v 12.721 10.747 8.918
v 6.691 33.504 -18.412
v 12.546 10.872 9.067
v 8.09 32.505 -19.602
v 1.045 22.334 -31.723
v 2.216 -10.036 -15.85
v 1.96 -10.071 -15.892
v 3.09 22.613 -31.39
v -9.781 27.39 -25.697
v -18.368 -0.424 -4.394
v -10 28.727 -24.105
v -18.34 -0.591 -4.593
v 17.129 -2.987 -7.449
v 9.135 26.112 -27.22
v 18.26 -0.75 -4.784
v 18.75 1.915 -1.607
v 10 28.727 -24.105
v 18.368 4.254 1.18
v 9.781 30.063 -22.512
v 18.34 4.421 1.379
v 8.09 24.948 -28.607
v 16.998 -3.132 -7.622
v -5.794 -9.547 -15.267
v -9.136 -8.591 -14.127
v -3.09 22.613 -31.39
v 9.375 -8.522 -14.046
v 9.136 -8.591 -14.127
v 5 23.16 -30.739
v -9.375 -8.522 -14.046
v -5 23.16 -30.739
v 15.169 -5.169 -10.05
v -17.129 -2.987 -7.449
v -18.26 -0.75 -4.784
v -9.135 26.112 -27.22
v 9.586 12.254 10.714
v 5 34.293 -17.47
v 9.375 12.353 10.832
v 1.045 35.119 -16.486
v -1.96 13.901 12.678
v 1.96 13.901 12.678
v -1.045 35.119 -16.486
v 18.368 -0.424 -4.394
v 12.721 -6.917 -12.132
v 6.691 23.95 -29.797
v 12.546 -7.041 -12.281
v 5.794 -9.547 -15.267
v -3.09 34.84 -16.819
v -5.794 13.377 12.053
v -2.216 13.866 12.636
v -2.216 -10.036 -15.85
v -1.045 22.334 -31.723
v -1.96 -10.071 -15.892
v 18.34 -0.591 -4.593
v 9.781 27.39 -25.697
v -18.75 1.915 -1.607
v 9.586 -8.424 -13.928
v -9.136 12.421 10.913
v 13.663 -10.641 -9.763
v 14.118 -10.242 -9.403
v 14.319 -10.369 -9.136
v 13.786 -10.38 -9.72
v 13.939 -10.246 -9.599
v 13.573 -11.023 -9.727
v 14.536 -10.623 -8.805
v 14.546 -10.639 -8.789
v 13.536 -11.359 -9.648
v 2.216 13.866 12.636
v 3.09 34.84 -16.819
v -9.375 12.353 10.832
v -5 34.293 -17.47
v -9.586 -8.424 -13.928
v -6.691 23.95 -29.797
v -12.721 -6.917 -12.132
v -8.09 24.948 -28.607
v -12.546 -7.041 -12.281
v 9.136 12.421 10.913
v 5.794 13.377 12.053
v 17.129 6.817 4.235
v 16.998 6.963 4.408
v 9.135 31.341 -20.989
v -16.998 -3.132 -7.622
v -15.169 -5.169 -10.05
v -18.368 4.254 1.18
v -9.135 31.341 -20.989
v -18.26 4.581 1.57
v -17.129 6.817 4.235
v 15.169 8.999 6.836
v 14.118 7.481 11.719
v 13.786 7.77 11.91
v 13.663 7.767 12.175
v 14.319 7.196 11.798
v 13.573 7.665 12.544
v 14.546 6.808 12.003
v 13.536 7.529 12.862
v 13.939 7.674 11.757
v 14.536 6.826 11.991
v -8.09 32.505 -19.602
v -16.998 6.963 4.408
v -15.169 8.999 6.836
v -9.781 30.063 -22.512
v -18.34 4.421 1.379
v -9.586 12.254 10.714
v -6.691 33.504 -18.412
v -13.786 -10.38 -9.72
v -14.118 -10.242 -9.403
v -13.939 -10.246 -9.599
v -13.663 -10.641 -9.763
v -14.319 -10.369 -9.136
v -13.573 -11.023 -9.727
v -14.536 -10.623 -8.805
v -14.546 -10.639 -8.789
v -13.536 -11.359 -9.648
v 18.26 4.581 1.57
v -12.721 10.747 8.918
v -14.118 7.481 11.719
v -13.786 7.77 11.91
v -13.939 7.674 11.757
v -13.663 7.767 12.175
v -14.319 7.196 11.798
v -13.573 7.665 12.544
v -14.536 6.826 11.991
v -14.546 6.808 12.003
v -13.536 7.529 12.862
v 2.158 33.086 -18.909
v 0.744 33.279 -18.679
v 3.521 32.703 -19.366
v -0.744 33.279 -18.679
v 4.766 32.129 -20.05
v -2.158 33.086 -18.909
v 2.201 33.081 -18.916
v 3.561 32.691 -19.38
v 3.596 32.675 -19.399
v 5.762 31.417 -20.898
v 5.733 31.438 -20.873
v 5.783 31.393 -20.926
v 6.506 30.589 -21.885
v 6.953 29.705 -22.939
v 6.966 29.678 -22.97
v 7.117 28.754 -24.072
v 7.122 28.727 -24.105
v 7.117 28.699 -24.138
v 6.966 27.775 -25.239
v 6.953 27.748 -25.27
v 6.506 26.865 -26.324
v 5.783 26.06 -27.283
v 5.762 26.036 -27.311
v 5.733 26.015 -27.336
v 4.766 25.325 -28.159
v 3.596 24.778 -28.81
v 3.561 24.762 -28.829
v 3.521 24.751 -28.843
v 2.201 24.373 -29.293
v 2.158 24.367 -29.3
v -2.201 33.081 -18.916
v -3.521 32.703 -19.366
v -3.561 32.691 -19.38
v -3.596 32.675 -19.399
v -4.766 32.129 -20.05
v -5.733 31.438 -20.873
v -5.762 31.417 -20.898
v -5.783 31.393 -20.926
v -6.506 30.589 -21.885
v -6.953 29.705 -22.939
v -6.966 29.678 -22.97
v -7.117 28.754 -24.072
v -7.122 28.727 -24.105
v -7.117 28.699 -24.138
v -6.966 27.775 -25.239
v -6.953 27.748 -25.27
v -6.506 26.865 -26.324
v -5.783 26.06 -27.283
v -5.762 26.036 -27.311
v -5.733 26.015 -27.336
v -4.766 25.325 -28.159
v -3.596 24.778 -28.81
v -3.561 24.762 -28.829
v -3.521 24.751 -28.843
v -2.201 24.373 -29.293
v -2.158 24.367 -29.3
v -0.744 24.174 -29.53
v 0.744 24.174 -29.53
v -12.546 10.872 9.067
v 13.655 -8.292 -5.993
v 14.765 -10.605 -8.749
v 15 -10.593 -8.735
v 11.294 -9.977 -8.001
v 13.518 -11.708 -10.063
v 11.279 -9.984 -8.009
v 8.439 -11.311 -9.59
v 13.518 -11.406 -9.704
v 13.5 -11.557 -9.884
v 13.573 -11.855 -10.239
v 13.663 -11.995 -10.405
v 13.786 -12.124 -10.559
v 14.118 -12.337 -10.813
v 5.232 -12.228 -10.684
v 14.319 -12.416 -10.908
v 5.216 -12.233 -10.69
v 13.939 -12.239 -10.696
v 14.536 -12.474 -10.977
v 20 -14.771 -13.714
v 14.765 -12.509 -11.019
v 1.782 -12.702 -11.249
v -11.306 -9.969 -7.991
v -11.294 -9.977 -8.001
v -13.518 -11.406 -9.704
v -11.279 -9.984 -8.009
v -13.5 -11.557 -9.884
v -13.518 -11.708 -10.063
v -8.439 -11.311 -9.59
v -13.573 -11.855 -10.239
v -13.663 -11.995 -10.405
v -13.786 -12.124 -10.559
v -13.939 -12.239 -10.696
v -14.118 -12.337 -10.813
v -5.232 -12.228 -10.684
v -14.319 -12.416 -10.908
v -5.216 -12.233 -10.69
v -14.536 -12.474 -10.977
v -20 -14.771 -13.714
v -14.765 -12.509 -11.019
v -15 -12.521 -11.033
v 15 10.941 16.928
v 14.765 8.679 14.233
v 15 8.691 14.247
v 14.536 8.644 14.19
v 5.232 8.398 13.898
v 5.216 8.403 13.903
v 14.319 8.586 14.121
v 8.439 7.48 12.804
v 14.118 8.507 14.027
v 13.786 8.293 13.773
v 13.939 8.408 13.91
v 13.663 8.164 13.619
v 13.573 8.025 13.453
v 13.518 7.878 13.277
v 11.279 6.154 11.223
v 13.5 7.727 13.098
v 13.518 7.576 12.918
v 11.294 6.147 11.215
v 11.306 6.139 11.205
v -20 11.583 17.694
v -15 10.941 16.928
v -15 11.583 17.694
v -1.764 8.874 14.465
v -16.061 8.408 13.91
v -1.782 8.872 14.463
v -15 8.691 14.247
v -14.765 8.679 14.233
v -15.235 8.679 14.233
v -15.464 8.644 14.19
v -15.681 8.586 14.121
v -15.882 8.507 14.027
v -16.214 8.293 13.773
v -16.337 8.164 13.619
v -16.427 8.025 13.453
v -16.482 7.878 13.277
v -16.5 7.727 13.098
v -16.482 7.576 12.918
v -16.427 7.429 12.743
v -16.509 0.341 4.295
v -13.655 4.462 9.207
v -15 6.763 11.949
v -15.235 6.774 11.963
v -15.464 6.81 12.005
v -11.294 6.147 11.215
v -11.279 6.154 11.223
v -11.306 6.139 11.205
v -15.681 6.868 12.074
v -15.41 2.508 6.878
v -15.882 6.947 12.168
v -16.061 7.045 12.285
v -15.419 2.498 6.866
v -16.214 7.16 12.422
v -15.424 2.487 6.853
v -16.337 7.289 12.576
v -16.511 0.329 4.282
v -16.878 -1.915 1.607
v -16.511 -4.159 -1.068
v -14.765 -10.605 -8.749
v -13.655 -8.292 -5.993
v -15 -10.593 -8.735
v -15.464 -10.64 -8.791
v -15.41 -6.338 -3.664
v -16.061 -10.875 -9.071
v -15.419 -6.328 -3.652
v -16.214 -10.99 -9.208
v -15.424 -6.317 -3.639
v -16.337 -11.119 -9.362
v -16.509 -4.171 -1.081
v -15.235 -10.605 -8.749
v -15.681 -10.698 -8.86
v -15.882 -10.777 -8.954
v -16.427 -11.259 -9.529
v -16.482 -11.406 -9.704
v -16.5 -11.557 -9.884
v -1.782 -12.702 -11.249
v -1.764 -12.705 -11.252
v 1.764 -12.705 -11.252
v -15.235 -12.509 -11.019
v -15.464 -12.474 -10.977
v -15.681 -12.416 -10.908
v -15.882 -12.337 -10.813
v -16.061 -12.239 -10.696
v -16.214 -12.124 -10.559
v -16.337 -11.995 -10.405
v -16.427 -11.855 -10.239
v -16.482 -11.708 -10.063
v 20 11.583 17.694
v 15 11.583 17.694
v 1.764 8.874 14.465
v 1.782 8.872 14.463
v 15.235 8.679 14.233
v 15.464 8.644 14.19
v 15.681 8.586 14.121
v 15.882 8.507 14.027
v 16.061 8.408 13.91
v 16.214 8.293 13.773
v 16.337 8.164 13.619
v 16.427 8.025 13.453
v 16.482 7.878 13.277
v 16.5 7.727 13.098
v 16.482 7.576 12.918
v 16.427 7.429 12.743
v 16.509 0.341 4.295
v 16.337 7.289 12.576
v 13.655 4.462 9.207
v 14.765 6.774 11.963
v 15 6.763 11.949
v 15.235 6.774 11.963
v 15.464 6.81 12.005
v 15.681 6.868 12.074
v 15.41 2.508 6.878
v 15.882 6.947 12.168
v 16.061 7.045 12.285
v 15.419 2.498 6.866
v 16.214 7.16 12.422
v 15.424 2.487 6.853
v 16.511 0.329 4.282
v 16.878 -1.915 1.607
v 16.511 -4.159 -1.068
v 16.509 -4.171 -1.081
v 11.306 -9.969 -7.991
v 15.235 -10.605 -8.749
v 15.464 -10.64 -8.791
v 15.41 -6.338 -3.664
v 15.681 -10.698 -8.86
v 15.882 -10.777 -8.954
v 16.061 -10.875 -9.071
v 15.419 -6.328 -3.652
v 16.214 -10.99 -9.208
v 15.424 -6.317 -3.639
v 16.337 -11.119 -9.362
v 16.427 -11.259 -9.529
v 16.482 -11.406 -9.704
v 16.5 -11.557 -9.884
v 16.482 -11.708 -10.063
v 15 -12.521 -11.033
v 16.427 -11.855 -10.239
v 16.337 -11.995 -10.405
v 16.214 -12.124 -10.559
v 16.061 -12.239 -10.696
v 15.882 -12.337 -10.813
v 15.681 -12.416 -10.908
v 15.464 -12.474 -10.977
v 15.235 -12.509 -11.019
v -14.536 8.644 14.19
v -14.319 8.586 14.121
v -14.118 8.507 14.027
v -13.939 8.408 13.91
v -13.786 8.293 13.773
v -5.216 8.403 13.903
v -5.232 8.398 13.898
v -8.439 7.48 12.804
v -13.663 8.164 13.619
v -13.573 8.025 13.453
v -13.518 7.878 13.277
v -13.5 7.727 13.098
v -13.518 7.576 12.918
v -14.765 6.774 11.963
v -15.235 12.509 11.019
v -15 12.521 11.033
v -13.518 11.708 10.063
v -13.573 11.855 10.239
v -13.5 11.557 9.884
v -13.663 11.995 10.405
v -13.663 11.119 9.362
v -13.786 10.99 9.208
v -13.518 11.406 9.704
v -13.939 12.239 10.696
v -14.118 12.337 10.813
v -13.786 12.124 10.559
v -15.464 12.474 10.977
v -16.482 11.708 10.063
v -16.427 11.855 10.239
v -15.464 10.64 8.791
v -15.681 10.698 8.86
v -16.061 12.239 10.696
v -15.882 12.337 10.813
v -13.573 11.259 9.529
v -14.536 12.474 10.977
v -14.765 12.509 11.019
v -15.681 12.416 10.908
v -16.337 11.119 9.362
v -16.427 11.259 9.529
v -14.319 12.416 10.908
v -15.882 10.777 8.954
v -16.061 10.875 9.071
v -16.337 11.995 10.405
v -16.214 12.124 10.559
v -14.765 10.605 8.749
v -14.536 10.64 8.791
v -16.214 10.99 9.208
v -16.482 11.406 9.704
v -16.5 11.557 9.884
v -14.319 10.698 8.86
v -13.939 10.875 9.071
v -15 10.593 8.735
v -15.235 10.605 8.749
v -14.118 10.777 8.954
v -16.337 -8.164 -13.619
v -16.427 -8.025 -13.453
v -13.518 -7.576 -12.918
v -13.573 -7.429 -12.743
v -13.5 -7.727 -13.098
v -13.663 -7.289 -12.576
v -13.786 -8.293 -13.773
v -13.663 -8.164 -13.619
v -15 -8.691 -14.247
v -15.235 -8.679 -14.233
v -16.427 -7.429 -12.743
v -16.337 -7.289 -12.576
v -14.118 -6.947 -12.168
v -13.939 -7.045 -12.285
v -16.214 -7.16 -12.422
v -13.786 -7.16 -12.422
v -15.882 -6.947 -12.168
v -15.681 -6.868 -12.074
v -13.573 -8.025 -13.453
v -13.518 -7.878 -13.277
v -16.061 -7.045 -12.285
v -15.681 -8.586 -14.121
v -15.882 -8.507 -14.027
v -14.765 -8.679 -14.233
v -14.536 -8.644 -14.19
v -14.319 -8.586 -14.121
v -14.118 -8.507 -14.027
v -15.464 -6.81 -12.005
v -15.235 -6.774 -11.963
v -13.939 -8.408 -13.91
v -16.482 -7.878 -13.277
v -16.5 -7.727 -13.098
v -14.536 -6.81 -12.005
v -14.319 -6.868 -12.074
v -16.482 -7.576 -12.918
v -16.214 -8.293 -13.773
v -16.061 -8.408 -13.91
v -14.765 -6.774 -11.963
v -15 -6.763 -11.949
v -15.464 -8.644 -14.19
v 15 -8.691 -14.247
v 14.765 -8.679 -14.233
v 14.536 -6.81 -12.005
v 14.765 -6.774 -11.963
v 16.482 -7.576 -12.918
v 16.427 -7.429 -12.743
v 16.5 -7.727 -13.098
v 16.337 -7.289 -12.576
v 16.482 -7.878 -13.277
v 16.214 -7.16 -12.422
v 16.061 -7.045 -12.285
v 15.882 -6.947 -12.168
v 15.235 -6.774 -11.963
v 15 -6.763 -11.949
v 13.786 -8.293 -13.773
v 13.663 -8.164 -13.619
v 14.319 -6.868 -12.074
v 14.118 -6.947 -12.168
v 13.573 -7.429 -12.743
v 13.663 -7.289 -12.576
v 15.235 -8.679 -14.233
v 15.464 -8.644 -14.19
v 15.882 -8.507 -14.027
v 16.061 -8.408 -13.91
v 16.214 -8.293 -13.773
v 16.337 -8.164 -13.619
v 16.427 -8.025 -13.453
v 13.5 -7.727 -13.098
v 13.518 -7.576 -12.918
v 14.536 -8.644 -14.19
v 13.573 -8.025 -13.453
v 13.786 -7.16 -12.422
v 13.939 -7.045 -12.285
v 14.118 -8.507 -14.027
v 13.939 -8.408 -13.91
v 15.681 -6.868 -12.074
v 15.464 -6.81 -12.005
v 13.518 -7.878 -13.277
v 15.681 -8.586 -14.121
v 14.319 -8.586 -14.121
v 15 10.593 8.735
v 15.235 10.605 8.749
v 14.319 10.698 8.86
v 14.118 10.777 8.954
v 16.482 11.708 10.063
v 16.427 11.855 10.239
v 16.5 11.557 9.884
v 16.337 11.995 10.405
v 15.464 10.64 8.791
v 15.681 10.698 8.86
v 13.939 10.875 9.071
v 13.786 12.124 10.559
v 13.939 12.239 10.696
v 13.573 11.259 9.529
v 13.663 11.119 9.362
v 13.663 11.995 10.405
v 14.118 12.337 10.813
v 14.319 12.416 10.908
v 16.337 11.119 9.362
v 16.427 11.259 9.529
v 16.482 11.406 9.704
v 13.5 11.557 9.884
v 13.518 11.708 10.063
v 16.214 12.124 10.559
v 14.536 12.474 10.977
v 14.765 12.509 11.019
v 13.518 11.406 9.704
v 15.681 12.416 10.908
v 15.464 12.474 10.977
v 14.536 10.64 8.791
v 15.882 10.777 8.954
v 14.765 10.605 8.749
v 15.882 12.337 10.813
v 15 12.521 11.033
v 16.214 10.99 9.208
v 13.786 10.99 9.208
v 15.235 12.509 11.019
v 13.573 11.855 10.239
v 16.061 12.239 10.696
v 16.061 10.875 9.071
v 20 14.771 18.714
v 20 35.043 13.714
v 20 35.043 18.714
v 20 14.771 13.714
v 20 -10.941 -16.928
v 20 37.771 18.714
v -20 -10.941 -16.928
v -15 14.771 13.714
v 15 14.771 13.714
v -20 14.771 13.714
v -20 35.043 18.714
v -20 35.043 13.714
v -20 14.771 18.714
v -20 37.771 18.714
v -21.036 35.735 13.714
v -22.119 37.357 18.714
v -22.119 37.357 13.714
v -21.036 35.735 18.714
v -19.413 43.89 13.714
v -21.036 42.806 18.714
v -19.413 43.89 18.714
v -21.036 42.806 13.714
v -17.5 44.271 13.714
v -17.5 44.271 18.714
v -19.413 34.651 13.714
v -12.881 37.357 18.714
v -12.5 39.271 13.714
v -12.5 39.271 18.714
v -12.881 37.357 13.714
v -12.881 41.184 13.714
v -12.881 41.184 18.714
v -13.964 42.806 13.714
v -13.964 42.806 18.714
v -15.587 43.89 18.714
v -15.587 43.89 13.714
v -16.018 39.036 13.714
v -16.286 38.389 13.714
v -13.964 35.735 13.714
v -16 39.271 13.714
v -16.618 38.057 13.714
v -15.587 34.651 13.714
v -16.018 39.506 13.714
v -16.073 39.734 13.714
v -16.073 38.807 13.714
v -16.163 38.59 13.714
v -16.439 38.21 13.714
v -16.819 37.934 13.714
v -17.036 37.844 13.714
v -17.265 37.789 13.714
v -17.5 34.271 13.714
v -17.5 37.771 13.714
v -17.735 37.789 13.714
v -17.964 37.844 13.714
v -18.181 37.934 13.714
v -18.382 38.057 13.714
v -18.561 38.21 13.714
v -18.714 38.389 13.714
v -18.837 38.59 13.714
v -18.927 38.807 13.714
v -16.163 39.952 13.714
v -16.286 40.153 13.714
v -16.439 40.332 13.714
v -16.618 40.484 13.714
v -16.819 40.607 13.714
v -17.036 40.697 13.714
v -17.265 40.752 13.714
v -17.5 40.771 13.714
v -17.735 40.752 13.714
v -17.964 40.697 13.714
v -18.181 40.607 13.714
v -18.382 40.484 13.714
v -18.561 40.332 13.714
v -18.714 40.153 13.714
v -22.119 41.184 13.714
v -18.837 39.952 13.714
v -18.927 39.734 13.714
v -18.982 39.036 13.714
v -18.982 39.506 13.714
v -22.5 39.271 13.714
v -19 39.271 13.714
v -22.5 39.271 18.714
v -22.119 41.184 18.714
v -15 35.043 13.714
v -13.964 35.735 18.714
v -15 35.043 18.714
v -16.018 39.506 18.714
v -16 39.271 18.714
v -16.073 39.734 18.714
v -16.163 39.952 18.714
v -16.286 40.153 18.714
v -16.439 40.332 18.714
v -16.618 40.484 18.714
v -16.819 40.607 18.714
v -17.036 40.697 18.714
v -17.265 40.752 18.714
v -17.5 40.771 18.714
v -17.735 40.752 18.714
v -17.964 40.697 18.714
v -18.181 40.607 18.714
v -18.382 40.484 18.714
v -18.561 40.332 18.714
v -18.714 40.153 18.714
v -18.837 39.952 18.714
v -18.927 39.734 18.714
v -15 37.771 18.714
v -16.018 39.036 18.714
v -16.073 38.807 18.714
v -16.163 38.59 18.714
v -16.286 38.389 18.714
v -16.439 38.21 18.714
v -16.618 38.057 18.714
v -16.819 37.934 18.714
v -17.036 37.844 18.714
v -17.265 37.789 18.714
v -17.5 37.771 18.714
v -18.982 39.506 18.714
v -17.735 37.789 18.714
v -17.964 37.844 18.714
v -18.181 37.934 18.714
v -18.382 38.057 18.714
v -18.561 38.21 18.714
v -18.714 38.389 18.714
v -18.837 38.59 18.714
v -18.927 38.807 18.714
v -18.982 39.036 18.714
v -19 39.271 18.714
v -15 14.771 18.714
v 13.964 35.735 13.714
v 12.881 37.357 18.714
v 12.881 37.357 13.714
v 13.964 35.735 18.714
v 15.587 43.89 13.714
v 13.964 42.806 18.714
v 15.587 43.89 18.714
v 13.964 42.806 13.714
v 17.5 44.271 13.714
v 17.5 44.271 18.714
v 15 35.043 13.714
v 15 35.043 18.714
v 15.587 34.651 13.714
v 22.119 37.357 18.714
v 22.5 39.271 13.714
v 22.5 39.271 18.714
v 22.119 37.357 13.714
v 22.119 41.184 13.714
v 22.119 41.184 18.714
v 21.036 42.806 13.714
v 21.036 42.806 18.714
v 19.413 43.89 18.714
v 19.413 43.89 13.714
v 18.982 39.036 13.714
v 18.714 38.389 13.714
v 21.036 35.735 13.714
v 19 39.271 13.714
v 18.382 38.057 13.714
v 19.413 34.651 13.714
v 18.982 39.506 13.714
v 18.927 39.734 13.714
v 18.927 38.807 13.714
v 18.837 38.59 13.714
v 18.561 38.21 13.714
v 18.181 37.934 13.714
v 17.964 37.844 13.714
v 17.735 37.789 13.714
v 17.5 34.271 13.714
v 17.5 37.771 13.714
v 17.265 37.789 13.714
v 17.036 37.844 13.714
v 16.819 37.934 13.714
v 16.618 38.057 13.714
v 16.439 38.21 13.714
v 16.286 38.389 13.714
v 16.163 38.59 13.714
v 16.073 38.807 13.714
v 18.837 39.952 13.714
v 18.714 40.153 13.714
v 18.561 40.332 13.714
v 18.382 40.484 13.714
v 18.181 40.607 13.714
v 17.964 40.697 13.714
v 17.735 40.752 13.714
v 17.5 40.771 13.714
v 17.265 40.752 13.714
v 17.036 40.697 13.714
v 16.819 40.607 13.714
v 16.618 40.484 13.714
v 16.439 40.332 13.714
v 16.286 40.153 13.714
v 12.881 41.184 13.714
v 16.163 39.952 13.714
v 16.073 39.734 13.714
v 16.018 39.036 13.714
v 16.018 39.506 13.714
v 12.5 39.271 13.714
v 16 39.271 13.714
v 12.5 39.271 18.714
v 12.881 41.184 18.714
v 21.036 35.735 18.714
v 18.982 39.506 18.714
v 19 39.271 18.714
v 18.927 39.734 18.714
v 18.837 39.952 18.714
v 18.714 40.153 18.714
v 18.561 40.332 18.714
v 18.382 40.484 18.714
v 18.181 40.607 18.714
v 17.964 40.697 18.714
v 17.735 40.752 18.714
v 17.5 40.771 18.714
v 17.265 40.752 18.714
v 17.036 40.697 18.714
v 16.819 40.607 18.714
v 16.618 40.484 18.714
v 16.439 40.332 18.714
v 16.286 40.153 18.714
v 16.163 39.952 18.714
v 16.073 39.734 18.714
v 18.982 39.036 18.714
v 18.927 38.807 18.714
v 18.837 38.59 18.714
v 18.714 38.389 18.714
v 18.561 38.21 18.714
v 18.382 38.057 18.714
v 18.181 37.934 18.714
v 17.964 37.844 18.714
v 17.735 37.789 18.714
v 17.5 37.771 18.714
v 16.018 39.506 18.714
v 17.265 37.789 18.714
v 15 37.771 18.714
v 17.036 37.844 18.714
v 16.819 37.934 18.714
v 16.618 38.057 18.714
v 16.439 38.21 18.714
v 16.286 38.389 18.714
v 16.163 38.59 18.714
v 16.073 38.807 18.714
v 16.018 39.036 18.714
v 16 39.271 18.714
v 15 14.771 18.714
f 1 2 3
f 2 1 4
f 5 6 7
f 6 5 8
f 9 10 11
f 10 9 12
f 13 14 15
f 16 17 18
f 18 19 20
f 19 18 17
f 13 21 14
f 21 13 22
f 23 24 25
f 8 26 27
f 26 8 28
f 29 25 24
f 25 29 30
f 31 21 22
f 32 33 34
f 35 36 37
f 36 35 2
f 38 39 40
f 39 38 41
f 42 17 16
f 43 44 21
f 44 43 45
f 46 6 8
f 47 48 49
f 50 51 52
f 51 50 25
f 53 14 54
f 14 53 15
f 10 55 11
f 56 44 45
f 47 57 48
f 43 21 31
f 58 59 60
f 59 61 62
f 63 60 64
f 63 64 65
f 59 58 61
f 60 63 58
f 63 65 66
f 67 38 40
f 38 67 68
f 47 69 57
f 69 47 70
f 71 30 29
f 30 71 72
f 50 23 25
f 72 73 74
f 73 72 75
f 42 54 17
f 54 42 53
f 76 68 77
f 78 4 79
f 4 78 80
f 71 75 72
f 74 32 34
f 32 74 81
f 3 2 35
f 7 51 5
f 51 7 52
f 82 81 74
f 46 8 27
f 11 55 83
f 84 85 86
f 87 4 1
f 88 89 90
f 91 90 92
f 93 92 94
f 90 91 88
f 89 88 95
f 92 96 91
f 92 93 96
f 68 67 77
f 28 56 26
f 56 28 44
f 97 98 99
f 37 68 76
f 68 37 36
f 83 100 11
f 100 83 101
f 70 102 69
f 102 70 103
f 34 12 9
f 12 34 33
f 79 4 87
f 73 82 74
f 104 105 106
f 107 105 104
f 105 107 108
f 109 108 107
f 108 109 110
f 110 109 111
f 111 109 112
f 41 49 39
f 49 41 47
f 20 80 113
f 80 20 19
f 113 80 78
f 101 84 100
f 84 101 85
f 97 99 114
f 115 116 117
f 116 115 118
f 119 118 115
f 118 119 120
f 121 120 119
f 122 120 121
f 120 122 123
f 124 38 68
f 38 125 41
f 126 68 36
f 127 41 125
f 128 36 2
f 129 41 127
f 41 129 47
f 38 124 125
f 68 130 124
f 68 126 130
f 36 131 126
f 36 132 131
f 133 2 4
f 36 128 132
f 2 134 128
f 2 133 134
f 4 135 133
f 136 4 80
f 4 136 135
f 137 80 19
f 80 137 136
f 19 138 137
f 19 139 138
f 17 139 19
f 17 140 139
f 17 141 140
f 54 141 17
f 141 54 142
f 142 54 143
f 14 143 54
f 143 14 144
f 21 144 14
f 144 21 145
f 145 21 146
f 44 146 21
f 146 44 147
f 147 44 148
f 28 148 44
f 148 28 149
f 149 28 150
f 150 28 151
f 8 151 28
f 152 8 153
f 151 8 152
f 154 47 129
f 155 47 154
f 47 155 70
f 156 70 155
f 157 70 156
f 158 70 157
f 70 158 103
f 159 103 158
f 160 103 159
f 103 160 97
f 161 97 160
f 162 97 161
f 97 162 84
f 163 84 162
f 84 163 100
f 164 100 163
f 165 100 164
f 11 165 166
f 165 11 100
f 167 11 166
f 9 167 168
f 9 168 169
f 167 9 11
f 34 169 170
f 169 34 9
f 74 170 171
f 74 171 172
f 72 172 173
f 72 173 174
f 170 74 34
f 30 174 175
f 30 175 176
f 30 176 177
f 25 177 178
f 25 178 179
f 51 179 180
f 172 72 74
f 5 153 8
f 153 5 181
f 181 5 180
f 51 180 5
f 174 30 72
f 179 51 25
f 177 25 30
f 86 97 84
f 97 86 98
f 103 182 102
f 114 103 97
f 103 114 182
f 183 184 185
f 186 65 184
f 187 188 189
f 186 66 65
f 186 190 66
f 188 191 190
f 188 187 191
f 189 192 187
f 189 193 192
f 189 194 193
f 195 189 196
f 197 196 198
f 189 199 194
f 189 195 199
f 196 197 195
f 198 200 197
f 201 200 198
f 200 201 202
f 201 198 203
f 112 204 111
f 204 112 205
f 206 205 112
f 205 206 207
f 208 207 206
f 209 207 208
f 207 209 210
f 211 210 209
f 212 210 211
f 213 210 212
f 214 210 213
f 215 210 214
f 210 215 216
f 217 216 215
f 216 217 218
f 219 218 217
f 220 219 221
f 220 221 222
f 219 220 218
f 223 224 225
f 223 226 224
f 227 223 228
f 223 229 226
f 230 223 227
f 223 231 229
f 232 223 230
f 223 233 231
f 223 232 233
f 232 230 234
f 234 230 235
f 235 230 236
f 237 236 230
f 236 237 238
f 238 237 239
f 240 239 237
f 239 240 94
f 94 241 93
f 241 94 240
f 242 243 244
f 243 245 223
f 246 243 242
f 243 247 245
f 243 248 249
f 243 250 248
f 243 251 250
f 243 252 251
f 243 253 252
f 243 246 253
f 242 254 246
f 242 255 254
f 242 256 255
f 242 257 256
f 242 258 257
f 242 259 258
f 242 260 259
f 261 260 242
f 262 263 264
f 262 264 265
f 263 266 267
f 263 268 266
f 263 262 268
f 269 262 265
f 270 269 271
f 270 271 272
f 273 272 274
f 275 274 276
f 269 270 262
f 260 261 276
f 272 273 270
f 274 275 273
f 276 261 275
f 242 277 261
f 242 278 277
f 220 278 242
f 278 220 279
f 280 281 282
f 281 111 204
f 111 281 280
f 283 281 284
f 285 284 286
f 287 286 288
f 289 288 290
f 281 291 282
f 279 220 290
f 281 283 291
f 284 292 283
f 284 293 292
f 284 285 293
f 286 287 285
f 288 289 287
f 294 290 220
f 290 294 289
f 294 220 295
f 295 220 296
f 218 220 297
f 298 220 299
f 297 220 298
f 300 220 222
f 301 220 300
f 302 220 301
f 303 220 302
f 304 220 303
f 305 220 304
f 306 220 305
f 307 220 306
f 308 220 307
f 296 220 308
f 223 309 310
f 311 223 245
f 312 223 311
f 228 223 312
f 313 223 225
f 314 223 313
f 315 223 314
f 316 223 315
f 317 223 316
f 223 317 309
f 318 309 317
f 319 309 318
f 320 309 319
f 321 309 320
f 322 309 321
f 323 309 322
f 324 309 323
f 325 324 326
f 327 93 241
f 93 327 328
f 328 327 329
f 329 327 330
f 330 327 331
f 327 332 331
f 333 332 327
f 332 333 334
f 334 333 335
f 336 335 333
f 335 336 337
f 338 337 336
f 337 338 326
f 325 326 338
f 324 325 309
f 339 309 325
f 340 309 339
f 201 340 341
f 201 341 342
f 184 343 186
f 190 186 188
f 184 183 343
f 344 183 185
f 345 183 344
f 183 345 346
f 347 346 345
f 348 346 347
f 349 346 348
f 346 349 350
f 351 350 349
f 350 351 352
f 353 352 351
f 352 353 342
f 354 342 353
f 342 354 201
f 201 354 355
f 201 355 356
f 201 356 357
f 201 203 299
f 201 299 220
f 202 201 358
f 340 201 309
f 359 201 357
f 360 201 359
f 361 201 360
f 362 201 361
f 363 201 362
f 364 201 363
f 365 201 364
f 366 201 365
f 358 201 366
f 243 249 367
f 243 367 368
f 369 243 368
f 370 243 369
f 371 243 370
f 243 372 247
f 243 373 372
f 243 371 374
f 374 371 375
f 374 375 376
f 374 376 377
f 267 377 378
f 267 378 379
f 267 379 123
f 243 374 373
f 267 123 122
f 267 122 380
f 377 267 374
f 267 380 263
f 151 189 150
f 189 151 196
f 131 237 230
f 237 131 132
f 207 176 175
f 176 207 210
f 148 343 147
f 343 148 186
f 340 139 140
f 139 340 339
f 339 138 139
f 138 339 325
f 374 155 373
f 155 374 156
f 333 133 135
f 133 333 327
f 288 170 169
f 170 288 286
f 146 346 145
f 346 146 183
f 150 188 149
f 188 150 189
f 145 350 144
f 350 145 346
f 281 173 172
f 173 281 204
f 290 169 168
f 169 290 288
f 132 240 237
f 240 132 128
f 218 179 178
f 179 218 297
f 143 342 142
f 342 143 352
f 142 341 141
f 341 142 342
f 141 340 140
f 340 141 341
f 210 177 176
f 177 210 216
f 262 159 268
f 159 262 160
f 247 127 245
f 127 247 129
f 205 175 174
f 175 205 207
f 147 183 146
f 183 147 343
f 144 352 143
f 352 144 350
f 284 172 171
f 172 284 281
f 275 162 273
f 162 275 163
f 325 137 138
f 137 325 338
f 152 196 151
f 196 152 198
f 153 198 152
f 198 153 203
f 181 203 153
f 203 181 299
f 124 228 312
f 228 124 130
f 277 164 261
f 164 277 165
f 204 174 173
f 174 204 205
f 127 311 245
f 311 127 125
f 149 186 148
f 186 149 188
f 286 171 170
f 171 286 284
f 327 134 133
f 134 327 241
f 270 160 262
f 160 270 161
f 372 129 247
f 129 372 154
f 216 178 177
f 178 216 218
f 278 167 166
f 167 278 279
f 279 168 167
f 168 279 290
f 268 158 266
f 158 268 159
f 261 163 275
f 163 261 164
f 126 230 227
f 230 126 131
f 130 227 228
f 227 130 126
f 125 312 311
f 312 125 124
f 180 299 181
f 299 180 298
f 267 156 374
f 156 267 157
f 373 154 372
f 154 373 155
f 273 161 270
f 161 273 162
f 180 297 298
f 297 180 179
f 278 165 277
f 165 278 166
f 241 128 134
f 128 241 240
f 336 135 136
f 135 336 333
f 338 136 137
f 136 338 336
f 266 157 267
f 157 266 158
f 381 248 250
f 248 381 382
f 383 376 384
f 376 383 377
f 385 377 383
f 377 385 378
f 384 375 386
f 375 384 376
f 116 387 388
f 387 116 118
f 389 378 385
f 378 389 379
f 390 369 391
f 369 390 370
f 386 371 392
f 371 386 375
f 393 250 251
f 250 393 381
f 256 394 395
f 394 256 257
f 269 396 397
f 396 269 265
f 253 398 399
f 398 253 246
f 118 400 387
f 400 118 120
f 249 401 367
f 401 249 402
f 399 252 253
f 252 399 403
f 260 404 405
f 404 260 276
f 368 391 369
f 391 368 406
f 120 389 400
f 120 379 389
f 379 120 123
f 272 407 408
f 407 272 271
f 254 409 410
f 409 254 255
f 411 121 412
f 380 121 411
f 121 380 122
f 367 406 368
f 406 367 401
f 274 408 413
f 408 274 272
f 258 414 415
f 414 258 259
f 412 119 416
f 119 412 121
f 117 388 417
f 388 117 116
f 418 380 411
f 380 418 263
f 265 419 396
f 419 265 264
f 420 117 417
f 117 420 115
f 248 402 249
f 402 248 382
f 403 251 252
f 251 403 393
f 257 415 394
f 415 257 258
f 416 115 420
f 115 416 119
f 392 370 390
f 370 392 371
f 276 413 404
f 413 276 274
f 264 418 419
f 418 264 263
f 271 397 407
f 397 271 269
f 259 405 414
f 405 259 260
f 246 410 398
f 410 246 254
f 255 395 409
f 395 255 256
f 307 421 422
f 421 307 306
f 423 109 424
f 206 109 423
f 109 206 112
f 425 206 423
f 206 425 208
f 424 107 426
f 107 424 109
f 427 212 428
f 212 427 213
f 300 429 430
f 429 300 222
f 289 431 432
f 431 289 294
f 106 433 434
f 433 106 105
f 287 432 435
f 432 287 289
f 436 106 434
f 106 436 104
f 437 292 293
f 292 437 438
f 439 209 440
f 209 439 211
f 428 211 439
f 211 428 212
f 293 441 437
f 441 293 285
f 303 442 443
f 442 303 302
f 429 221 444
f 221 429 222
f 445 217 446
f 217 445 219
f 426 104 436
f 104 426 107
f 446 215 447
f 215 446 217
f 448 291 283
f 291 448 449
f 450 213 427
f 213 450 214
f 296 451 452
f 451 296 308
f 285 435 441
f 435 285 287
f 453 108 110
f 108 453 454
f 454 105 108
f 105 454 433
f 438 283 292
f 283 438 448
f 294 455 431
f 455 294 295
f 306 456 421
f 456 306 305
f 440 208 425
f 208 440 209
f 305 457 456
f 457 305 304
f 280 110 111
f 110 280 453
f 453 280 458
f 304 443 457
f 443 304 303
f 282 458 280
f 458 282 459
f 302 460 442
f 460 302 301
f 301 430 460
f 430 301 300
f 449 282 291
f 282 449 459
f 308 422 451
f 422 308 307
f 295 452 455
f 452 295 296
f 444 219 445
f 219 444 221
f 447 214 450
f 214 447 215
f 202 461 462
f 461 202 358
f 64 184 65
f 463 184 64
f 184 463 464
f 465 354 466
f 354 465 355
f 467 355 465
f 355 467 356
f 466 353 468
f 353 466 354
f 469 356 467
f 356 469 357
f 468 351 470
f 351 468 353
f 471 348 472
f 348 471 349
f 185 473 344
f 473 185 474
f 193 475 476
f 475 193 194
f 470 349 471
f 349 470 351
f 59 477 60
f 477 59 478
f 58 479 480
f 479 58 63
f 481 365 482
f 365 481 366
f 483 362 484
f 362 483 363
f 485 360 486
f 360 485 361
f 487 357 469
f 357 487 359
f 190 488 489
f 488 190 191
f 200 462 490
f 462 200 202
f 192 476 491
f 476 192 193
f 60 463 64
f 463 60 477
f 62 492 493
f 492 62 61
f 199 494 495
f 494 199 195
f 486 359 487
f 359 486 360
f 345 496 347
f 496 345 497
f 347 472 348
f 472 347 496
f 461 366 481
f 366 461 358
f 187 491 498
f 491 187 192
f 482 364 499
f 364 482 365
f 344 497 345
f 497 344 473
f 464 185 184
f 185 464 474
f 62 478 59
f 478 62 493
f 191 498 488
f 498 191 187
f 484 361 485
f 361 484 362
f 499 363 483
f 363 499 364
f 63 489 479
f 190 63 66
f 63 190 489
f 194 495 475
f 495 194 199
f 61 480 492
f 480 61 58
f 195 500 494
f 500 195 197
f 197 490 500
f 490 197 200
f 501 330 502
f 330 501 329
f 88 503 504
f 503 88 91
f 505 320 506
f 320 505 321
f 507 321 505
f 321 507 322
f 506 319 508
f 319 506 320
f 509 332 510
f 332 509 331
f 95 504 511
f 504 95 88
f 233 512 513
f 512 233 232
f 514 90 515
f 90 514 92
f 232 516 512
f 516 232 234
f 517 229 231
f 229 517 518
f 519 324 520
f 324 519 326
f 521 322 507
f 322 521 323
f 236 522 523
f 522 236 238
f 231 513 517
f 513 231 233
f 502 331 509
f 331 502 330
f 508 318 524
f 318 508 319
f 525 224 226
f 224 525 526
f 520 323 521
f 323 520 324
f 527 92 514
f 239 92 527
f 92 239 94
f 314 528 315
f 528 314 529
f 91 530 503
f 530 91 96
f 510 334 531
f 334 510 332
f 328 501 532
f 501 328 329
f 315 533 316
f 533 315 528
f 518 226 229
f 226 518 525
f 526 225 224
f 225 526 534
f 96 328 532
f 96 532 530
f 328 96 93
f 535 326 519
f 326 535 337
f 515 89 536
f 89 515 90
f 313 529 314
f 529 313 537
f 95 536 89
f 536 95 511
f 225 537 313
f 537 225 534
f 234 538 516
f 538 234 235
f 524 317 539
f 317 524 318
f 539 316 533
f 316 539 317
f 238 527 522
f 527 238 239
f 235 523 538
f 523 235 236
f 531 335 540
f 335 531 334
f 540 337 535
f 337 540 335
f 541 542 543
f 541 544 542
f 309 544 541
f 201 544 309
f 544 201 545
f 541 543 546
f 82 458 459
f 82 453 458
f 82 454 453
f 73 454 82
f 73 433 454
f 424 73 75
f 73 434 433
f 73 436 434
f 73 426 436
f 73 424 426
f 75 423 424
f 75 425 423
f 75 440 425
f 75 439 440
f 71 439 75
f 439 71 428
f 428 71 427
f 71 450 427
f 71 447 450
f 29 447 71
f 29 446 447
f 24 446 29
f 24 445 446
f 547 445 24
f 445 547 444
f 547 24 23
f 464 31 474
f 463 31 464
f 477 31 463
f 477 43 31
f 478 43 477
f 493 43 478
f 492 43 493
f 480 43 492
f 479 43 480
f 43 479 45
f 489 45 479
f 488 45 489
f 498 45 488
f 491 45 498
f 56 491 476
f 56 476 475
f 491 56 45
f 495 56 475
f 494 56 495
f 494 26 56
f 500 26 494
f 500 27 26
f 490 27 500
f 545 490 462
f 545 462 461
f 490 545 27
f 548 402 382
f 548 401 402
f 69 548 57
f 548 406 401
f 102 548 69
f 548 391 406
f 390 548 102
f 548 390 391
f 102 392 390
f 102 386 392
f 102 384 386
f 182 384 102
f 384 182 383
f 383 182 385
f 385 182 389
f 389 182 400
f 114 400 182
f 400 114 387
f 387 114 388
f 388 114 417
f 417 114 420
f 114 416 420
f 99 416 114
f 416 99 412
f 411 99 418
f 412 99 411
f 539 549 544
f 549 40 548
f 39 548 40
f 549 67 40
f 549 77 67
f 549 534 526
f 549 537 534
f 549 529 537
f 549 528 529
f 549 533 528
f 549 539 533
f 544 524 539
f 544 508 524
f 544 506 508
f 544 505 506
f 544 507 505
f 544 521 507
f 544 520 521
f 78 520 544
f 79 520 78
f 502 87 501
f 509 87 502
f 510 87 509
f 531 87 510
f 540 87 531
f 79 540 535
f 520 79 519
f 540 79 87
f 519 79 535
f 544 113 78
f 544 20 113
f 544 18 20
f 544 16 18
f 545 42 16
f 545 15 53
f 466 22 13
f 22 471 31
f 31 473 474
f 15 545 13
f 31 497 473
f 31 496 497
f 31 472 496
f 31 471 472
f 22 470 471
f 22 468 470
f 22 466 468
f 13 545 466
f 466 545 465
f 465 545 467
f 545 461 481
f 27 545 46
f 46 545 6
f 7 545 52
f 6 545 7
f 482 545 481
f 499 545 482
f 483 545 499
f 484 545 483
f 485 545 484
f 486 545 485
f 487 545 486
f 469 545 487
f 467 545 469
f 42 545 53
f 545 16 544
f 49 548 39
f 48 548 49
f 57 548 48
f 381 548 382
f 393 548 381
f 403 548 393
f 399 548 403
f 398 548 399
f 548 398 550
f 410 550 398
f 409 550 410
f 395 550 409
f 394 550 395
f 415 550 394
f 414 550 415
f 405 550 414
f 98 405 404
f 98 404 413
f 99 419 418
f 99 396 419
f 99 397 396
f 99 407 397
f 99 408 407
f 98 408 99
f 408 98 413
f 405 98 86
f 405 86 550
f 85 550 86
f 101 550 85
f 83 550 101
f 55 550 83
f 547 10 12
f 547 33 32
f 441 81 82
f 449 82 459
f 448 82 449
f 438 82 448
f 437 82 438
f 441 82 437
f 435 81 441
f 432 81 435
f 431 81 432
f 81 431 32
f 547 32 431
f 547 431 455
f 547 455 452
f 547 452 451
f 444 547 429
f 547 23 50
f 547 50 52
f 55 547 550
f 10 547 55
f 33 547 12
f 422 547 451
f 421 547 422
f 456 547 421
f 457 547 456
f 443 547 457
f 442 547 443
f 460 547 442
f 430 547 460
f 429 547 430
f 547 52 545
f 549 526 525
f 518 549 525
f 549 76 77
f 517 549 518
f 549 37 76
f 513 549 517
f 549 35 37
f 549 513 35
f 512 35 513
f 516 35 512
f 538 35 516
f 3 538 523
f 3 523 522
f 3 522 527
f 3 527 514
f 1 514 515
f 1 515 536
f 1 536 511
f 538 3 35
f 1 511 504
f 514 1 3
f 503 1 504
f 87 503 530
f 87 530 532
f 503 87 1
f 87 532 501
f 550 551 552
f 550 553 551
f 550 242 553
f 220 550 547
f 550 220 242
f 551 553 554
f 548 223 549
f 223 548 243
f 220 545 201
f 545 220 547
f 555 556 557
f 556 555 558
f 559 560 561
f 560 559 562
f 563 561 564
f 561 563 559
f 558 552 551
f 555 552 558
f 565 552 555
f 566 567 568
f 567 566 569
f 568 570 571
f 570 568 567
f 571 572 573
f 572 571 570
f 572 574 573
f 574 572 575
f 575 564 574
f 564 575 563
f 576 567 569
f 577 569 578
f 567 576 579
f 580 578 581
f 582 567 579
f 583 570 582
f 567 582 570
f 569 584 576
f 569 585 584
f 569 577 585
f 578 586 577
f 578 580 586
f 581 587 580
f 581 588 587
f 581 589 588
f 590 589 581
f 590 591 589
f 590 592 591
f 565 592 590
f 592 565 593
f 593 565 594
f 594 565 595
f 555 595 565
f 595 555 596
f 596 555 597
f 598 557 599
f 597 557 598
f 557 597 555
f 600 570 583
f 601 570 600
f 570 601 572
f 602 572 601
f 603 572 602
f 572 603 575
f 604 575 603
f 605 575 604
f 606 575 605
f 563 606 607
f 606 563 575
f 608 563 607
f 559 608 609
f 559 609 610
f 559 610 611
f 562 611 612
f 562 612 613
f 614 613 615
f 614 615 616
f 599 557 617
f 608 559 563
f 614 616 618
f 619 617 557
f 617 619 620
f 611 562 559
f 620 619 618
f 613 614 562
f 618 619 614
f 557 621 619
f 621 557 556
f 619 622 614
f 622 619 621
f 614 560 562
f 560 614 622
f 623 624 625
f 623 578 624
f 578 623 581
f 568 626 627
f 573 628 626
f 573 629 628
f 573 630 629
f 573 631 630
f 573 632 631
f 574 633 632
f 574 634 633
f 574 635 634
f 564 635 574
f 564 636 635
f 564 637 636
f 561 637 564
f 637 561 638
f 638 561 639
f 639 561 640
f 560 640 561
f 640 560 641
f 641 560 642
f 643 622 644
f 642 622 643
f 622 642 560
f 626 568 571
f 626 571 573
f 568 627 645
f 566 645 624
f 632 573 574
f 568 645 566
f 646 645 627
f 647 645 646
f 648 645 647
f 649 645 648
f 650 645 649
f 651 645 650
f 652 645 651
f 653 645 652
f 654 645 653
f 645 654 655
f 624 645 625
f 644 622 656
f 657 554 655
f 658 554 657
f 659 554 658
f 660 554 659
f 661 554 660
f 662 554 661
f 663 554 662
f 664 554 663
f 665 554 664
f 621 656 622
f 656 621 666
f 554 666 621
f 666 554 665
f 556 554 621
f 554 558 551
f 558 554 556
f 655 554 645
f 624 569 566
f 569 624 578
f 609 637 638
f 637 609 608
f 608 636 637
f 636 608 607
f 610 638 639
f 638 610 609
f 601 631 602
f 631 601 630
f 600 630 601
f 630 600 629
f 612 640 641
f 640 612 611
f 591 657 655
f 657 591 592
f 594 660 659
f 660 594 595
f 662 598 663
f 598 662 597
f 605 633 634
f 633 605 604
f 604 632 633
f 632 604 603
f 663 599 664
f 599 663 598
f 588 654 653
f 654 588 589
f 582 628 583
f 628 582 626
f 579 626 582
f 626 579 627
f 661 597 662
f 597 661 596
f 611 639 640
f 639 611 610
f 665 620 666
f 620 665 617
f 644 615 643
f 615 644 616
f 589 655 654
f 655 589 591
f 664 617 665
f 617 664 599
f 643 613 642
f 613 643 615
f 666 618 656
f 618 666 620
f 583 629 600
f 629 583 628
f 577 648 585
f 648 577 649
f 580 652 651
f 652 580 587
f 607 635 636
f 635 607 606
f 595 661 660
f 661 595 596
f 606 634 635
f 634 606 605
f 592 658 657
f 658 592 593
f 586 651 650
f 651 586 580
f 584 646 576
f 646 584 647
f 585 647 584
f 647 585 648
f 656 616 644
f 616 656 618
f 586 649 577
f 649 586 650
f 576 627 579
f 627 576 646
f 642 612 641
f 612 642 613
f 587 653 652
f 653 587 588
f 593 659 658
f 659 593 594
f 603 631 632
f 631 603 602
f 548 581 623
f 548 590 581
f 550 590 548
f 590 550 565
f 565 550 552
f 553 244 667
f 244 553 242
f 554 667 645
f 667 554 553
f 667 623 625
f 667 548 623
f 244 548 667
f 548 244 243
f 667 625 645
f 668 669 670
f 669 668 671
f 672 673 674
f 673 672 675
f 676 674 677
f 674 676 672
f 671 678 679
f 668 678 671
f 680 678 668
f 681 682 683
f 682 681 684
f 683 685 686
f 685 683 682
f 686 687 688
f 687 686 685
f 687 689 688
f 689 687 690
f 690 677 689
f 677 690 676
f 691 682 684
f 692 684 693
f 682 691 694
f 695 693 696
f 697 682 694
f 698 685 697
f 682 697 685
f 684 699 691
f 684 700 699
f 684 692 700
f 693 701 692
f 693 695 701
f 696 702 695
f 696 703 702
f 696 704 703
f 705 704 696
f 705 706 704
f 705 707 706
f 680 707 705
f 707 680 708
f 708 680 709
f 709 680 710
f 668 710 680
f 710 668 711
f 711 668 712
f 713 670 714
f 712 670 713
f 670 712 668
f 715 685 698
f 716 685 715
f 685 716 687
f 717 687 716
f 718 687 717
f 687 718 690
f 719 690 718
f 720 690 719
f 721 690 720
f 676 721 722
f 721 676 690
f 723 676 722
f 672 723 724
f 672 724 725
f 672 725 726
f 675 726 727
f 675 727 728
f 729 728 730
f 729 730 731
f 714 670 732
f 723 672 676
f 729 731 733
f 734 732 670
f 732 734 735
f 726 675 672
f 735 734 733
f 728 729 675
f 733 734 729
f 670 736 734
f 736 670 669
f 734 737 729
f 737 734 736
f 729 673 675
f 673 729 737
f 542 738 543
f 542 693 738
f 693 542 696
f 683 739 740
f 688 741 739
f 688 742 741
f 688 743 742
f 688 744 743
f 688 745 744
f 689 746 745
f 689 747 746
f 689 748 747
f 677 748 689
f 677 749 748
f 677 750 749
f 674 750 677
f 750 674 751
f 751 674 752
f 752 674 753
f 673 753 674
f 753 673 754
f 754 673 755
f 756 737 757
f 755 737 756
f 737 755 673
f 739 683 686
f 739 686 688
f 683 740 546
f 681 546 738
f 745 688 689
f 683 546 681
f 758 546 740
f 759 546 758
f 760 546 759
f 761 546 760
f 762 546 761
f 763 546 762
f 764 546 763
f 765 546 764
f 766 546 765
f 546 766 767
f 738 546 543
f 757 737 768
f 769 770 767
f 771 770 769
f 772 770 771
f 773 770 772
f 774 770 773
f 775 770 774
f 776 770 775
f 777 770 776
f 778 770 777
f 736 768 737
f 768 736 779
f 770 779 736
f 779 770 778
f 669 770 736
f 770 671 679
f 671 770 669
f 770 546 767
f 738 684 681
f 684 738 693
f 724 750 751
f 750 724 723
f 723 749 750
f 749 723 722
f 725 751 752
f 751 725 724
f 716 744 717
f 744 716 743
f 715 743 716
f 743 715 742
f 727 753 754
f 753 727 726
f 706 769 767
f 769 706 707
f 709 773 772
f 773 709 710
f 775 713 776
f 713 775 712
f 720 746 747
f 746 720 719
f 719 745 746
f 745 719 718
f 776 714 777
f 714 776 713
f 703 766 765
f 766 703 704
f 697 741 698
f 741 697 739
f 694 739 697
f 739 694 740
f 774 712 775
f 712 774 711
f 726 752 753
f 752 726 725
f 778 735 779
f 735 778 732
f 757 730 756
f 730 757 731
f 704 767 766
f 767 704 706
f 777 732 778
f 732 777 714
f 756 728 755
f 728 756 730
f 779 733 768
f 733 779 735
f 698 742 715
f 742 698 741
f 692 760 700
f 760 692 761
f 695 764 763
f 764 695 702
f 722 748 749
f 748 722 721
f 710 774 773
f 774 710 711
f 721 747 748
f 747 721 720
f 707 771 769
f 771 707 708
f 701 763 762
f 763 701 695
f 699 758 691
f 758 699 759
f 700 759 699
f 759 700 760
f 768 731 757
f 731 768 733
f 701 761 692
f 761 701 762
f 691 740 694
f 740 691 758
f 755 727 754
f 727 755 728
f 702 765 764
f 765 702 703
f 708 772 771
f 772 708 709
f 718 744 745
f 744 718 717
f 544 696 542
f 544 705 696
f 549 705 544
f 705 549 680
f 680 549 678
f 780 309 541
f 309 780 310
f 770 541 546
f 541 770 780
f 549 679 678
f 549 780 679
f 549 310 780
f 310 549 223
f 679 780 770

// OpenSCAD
/* (in progress) A fan duct mount for reprap-style printers

Inspired by: http://www.thingiverse.com/thing:16970
*/
default_boltsize = 3;
inset = 2 + default_boltsize;  // distance from an edge to center of bolt holes

mount_width = 40;
mount_depth = 5;

cone_ri_base = mount_width/2 - 3;
cone_ro_top = 20/2;
cone_thickness = 3;
cone_h = 40;
cone_angle = 50;


arm_length = 20 + default_boltsize;
arm_width = 5;
arm_depth = mount_depth;

module cone() {
  difference() {
    cylinder(r2=cone_ri_base + cone_thickness, r1=cone_ro_top, h=cone_h, center=false);
    translate([0, 0, -.5])
      cylinder(r2=cone_ri_base, r1=cone_ro_top - cone_thickness, h=cone_h+1, center=false);
  }
}


module angled_bracket() {
  hull() {
    cube([arm_width, 1, arm_depth], center=false);
    rotate([0, cone_angle, 90])translate([0, -arm_width, 0])
      cube([arm_length, arm_width, arm_depth], center=false);
  }
}

module arm() {
  union() {
    angled_bracket();
    // add bolt holes
    rotate([0, cone_angle, 90])translate([arm_length+default_boltsize/2, -arm_width/2, 0])
      difference(){
        cylinder(r=inset, h=arm_depth);
        translate([0, 0, -.5])cylinder(r=default_boltsize/2, h=arm_depth + 1, $fn=40);
      }
  }
}

module fan_mount() {
  union() {
    difference() {
      cube([mount_width, mount_width, mount_depth], center=true);
      cylinder(r=cone_ri_base, h=mount_depth+1, center=true, $fn=40);
      // make bolt holes on corners
      for (sign = [-1, 1], sign2 = [-1, 1]) {
        assign (corner = sign * (mount_width/2 - inset)) {
          translate([corner, sign2 * corner, -mount_depth/2 - .5])
            cylinder(r=default_boltsize/2, h=mount_depth+1, $fn=40);
        }
      }
    }
    // add arms
    translate([-mount_width/2, mount_width/2, -mount_depth/2])
      difference() {
        union() {
        arm();
        translate([mount_width-arm_width, 0, 0])arm();
        }
      }
  }
}

module mounted_fan_duct() {
  union() {
    translate([0, 0, -cone_h + mount_depth/2])cone();
    fan_mount();
  }
}

rotate([cone_angle, 0, 0])
  mounted_fan_duct();
